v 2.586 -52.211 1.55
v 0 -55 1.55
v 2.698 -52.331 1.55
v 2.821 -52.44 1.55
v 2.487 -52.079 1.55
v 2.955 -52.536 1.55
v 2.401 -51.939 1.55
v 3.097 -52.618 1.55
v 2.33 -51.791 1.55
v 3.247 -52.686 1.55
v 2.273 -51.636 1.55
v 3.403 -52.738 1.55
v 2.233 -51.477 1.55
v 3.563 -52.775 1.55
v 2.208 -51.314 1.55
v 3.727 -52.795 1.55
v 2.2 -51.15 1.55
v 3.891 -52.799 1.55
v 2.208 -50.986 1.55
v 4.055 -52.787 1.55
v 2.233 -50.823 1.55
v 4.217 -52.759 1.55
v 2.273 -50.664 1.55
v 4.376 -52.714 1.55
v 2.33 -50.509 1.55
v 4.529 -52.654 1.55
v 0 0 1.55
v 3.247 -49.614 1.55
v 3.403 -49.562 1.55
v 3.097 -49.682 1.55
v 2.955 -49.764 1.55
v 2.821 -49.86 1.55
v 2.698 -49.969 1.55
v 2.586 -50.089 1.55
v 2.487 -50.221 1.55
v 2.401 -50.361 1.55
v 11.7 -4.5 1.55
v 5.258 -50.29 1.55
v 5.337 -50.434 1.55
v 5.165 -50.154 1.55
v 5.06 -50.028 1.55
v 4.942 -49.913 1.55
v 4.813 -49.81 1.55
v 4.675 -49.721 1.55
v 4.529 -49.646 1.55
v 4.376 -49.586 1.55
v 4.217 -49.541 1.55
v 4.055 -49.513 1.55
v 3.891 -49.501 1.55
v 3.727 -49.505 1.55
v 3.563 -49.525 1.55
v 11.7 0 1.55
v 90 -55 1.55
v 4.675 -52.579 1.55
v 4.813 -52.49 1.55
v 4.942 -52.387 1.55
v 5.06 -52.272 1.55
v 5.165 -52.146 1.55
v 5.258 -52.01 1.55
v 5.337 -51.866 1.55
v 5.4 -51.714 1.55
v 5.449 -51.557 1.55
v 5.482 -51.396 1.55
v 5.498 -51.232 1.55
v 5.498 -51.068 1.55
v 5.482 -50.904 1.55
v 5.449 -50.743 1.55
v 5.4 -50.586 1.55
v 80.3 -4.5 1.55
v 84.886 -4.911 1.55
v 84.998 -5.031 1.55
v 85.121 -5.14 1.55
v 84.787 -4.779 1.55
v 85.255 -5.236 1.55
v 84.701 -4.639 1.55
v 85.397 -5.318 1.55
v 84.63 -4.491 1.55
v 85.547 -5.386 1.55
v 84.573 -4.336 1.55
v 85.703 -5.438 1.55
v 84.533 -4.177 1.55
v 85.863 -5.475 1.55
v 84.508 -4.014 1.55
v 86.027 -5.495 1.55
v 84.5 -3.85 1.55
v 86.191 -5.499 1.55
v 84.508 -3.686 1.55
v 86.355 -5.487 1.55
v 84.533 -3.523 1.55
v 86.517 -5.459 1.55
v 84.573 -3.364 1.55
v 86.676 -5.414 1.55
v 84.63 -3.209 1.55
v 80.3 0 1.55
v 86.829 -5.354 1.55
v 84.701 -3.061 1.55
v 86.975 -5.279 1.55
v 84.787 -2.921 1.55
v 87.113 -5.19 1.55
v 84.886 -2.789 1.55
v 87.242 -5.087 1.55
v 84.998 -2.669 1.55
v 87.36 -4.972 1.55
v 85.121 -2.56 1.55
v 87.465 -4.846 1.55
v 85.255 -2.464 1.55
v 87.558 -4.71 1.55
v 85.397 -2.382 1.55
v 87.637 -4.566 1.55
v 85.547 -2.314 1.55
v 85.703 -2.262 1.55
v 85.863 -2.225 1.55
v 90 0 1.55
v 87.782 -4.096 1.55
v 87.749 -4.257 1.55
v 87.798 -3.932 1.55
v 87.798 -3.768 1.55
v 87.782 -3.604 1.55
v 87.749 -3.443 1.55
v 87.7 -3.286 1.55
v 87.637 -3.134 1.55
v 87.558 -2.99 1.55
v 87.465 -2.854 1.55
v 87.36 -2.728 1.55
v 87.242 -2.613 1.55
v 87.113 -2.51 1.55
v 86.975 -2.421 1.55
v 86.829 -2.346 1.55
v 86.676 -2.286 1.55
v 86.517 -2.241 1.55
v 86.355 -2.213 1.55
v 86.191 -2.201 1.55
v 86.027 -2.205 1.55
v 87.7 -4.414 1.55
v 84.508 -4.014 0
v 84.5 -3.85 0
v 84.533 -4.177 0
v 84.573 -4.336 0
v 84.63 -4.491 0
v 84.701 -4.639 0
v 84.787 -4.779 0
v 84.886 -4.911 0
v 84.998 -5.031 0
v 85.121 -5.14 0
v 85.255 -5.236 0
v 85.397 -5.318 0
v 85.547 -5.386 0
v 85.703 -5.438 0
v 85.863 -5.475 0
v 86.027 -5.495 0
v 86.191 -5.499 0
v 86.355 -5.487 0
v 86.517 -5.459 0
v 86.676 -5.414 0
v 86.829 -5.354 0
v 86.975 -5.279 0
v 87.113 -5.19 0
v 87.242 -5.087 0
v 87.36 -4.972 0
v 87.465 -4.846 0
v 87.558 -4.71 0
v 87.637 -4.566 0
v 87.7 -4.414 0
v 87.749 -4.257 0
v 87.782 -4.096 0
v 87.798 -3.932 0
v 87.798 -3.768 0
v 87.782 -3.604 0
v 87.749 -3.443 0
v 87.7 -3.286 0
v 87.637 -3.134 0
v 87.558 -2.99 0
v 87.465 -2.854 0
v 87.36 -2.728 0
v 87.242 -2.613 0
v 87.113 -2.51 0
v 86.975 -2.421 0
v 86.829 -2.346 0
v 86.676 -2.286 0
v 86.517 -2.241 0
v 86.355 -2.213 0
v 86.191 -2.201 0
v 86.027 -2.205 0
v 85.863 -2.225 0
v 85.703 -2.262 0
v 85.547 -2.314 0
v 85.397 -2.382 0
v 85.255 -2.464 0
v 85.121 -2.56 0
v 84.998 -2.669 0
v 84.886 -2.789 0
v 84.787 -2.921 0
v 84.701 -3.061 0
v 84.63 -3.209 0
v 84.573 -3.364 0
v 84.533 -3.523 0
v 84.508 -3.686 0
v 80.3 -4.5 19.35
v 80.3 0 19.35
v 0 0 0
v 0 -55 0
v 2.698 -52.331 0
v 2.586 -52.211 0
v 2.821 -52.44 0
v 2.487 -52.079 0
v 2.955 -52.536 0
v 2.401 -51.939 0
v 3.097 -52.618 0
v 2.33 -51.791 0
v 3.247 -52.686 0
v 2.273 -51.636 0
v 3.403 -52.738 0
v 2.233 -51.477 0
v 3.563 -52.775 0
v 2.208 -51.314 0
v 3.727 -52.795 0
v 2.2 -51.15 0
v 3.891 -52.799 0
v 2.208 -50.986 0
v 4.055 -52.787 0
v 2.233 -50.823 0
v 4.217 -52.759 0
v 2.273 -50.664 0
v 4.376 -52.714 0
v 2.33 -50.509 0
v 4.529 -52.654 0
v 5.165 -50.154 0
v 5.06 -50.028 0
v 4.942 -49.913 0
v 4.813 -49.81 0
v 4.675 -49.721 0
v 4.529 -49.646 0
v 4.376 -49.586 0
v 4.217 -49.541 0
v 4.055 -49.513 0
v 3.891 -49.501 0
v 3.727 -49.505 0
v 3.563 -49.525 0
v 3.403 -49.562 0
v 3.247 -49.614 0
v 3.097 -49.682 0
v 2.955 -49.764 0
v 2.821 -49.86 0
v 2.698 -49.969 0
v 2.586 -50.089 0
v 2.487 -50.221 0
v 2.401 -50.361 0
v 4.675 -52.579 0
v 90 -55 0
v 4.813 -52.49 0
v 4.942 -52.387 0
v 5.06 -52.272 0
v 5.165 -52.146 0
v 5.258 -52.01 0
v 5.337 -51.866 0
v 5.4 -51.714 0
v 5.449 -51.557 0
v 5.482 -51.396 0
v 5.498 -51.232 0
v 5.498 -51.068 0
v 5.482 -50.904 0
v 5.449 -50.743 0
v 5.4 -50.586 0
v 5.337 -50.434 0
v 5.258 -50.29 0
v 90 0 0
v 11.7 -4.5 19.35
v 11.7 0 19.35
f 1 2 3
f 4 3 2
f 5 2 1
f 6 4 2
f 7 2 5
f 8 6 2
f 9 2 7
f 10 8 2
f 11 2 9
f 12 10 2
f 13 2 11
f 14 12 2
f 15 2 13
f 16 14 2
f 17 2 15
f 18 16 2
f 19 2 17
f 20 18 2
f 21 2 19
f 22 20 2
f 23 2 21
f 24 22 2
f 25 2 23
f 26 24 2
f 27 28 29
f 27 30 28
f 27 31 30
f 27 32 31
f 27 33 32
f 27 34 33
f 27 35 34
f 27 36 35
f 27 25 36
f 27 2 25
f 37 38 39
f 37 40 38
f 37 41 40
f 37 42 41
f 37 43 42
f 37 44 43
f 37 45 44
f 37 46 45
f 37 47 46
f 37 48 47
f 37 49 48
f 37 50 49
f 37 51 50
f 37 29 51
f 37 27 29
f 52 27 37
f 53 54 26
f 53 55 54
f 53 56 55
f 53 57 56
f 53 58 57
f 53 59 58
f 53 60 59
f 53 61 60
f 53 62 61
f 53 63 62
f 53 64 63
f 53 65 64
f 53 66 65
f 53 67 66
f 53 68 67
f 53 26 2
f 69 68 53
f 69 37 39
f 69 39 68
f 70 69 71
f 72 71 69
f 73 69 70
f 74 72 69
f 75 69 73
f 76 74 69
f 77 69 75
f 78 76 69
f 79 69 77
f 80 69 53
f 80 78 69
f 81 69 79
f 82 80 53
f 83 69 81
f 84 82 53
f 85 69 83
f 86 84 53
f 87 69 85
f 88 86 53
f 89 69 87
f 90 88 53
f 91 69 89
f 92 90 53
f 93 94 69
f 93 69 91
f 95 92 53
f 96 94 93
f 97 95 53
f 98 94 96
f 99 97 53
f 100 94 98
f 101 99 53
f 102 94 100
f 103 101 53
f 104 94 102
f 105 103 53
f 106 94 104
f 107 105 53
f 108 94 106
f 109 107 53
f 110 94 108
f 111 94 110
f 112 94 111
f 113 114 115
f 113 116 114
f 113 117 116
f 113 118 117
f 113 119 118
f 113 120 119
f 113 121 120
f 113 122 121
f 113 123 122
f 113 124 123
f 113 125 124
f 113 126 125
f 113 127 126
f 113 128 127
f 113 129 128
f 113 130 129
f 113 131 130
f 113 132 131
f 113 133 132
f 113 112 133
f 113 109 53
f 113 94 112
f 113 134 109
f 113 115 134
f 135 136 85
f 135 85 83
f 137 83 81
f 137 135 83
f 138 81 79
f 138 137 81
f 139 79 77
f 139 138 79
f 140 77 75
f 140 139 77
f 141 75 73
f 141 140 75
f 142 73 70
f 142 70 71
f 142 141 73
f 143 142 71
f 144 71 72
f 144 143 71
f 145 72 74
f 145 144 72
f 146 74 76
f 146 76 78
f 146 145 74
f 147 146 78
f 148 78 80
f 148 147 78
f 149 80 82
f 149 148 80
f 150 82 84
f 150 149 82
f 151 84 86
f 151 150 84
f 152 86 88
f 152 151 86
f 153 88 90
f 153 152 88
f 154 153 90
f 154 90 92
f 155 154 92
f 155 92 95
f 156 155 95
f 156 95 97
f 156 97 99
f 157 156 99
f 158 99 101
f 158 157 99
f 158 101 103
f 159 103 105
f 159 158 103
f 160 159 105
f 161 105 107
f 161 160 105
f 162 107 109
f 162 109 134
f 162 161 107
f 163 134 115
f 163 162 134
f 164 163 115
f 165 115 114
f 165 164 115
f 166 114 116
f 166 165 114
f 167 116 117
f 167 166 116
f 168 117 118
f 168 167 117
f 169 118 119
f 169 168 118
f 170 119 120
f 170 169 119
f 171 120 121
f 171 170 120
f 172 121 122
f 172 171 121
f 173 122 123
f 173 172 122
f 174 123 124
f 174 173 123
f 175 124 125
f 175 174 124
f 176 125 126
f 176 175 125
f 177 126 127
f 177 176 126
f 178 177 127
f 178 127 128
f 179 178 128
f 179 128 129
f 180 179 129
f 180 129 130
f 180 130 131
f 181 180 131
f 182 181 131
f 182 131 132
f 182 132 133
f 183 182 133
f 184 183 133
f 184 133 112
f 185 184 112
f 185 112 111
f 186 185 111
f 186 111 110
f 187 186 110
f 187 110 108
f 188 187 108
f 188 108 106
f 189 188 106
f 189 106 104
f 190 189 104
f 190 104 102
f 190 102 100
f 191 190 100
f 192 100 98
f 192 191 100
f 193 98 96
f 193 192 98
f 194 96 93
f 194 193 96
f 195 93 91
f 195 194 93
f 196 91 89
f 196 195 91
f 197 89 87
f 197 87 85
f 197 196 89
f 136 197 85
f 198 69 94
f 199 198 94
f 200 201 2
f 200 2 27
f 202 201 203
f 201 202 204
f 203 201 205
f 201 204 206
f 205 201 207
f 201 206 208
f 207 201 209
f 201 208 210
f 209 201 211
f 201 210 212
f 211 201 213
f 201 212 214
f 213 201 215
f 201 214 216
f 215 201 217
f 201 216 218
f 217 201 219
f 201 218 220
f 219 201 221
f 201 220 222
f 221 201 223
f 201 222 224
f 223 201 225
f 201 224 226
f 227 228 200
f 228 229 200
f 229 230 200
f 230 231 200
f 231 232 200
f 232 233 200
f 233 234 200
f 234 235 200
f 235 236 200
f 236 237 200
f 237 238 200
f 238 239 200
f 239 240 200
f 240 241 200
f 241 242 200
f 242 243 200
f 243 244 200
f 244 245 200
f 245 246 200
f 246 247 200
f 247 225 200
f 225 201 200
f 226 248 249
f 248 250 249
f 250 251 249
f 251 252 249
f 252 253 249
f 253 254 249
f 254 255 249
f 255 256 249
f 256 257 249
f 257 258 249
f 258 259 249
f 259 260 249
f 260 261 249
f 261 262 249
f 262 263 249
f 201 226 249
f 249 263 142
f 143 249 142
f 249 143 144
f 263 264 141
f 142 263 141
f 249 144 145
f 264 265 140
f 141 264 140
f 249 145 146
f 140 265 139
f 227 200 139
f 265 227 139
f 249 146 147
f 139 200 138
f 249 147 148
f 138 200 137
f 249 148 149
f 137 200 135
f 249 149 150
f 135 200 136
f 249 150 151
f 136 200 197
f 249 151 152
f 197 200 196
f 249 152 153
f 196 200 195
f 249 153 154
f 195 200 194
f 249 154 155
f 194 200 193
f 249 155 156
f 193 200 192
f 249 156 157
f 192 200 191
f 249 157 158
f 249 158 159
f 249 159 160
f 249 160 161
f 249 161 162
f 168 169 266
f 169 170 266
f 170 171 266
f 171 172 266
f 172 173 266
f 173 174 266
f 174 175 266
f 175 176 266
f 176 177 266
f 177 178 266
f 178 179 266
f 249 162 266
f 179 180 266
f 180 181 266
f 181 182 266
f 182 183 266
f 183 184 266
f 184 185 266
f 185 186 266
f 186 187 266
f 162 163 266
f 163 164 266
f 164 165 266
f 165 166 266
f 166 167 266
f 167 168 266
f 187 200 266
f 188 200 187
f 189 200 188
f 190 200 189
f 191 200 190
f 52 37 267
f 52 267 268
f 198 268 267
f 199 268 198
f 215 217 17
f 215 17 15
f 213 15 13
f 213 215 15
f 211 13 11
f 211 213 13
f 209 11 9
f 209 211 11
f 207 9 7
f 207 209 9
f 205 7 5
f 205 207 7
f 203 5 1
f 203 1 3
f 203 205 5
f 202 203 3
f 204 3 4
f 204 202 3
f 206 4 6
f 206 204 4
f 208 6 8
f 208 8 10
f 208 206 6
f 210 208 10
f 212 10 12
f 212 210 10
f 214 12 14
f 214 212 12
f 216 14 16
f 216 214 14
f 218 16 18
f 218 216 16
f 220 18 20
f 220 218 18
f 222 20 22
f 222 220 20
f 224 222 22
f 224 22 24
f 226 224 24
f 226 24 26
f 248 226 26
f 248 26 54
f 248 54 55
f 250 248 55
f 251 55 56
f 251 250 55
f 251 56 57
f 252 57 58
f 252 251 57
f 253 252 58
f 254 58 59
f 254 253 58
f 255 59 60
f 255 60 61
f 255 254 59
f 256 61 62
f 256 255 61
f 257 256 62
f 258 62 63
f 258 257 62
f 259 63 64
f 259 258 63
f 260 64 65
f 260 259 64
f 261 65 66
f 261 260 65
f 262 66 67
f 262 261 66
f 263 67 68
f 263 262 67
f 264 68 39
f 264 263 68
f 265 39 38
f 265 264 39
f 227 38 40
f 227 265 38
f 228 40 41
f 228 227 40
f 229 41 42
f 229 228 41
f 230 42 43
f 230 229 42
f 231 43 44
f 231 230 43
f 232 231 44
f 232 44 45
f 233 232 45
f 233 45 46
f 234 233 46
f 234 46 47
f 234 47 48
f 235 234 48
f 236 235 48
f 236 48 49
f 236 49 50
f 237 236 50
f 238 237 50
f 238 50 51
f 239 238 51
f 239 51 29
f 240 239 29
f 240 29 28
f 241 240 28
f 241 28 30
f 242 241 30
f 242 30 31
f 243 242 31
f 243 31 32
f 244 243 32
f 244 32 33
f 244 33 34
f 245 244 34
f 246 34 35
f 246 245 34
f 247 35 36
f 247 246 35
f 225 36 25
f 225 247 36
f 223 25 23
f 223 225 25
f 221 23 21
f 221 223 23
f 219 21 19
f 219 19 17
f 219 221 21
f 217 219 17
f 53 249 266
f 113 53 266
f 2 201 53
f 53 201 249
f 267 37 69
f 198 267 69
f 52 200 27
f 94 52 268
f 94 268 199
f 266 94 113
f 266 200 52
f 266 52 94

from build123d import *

# Parameters (mm, degrees)
IZIM1_W                     = 90
IZIM1_H                     = 55
IZIM1_R                     = 1.65
Y_KSEKLIK_EKSTR_ZYON1_DEPTH = 1.55
IZIM2_W                     = 68.6
IZIM2_H                     = 4.5
Y_KSEKLIK_EKSTR_ZYON2_DEPTH = 17.8


with BuildPart() as part:
    # Çizim1 → Yükseklik-Ekstrüzyon1 (new body)
    with BuildSketch(Plane.XY):
        with Locations((45, -27.5)):
            Rectangle(IZIM1_W, IZIM1_H)
        with Locations(Location((86.15, -3.85, 0), (0, 0, 180))):
            Circle(IZIM1_R, mode=Mode.SUBTRACT)
        with Locations(Location((3.85, -51.15, 0), (0, 0, 180))):
            Circle(IZIM1_R, mode=Mode.SUBTRACT)
    extrude(amount=Y_KSEKLIK_EKSTR_ZYON1_DEPTH)

    # Çizim2 → Yükseklik-Ekstrüzyon2 (add)
    with BuildSketch(Plane.XY.offset(1.55)):
        with Locations((46, -2.25)):
            Rectangle(IZIM2_W, IZIM2_H)
    extrude(amount=Y_KSEKLIK_EKSTR_ZYON2_DEPTH)


solid = part.part
